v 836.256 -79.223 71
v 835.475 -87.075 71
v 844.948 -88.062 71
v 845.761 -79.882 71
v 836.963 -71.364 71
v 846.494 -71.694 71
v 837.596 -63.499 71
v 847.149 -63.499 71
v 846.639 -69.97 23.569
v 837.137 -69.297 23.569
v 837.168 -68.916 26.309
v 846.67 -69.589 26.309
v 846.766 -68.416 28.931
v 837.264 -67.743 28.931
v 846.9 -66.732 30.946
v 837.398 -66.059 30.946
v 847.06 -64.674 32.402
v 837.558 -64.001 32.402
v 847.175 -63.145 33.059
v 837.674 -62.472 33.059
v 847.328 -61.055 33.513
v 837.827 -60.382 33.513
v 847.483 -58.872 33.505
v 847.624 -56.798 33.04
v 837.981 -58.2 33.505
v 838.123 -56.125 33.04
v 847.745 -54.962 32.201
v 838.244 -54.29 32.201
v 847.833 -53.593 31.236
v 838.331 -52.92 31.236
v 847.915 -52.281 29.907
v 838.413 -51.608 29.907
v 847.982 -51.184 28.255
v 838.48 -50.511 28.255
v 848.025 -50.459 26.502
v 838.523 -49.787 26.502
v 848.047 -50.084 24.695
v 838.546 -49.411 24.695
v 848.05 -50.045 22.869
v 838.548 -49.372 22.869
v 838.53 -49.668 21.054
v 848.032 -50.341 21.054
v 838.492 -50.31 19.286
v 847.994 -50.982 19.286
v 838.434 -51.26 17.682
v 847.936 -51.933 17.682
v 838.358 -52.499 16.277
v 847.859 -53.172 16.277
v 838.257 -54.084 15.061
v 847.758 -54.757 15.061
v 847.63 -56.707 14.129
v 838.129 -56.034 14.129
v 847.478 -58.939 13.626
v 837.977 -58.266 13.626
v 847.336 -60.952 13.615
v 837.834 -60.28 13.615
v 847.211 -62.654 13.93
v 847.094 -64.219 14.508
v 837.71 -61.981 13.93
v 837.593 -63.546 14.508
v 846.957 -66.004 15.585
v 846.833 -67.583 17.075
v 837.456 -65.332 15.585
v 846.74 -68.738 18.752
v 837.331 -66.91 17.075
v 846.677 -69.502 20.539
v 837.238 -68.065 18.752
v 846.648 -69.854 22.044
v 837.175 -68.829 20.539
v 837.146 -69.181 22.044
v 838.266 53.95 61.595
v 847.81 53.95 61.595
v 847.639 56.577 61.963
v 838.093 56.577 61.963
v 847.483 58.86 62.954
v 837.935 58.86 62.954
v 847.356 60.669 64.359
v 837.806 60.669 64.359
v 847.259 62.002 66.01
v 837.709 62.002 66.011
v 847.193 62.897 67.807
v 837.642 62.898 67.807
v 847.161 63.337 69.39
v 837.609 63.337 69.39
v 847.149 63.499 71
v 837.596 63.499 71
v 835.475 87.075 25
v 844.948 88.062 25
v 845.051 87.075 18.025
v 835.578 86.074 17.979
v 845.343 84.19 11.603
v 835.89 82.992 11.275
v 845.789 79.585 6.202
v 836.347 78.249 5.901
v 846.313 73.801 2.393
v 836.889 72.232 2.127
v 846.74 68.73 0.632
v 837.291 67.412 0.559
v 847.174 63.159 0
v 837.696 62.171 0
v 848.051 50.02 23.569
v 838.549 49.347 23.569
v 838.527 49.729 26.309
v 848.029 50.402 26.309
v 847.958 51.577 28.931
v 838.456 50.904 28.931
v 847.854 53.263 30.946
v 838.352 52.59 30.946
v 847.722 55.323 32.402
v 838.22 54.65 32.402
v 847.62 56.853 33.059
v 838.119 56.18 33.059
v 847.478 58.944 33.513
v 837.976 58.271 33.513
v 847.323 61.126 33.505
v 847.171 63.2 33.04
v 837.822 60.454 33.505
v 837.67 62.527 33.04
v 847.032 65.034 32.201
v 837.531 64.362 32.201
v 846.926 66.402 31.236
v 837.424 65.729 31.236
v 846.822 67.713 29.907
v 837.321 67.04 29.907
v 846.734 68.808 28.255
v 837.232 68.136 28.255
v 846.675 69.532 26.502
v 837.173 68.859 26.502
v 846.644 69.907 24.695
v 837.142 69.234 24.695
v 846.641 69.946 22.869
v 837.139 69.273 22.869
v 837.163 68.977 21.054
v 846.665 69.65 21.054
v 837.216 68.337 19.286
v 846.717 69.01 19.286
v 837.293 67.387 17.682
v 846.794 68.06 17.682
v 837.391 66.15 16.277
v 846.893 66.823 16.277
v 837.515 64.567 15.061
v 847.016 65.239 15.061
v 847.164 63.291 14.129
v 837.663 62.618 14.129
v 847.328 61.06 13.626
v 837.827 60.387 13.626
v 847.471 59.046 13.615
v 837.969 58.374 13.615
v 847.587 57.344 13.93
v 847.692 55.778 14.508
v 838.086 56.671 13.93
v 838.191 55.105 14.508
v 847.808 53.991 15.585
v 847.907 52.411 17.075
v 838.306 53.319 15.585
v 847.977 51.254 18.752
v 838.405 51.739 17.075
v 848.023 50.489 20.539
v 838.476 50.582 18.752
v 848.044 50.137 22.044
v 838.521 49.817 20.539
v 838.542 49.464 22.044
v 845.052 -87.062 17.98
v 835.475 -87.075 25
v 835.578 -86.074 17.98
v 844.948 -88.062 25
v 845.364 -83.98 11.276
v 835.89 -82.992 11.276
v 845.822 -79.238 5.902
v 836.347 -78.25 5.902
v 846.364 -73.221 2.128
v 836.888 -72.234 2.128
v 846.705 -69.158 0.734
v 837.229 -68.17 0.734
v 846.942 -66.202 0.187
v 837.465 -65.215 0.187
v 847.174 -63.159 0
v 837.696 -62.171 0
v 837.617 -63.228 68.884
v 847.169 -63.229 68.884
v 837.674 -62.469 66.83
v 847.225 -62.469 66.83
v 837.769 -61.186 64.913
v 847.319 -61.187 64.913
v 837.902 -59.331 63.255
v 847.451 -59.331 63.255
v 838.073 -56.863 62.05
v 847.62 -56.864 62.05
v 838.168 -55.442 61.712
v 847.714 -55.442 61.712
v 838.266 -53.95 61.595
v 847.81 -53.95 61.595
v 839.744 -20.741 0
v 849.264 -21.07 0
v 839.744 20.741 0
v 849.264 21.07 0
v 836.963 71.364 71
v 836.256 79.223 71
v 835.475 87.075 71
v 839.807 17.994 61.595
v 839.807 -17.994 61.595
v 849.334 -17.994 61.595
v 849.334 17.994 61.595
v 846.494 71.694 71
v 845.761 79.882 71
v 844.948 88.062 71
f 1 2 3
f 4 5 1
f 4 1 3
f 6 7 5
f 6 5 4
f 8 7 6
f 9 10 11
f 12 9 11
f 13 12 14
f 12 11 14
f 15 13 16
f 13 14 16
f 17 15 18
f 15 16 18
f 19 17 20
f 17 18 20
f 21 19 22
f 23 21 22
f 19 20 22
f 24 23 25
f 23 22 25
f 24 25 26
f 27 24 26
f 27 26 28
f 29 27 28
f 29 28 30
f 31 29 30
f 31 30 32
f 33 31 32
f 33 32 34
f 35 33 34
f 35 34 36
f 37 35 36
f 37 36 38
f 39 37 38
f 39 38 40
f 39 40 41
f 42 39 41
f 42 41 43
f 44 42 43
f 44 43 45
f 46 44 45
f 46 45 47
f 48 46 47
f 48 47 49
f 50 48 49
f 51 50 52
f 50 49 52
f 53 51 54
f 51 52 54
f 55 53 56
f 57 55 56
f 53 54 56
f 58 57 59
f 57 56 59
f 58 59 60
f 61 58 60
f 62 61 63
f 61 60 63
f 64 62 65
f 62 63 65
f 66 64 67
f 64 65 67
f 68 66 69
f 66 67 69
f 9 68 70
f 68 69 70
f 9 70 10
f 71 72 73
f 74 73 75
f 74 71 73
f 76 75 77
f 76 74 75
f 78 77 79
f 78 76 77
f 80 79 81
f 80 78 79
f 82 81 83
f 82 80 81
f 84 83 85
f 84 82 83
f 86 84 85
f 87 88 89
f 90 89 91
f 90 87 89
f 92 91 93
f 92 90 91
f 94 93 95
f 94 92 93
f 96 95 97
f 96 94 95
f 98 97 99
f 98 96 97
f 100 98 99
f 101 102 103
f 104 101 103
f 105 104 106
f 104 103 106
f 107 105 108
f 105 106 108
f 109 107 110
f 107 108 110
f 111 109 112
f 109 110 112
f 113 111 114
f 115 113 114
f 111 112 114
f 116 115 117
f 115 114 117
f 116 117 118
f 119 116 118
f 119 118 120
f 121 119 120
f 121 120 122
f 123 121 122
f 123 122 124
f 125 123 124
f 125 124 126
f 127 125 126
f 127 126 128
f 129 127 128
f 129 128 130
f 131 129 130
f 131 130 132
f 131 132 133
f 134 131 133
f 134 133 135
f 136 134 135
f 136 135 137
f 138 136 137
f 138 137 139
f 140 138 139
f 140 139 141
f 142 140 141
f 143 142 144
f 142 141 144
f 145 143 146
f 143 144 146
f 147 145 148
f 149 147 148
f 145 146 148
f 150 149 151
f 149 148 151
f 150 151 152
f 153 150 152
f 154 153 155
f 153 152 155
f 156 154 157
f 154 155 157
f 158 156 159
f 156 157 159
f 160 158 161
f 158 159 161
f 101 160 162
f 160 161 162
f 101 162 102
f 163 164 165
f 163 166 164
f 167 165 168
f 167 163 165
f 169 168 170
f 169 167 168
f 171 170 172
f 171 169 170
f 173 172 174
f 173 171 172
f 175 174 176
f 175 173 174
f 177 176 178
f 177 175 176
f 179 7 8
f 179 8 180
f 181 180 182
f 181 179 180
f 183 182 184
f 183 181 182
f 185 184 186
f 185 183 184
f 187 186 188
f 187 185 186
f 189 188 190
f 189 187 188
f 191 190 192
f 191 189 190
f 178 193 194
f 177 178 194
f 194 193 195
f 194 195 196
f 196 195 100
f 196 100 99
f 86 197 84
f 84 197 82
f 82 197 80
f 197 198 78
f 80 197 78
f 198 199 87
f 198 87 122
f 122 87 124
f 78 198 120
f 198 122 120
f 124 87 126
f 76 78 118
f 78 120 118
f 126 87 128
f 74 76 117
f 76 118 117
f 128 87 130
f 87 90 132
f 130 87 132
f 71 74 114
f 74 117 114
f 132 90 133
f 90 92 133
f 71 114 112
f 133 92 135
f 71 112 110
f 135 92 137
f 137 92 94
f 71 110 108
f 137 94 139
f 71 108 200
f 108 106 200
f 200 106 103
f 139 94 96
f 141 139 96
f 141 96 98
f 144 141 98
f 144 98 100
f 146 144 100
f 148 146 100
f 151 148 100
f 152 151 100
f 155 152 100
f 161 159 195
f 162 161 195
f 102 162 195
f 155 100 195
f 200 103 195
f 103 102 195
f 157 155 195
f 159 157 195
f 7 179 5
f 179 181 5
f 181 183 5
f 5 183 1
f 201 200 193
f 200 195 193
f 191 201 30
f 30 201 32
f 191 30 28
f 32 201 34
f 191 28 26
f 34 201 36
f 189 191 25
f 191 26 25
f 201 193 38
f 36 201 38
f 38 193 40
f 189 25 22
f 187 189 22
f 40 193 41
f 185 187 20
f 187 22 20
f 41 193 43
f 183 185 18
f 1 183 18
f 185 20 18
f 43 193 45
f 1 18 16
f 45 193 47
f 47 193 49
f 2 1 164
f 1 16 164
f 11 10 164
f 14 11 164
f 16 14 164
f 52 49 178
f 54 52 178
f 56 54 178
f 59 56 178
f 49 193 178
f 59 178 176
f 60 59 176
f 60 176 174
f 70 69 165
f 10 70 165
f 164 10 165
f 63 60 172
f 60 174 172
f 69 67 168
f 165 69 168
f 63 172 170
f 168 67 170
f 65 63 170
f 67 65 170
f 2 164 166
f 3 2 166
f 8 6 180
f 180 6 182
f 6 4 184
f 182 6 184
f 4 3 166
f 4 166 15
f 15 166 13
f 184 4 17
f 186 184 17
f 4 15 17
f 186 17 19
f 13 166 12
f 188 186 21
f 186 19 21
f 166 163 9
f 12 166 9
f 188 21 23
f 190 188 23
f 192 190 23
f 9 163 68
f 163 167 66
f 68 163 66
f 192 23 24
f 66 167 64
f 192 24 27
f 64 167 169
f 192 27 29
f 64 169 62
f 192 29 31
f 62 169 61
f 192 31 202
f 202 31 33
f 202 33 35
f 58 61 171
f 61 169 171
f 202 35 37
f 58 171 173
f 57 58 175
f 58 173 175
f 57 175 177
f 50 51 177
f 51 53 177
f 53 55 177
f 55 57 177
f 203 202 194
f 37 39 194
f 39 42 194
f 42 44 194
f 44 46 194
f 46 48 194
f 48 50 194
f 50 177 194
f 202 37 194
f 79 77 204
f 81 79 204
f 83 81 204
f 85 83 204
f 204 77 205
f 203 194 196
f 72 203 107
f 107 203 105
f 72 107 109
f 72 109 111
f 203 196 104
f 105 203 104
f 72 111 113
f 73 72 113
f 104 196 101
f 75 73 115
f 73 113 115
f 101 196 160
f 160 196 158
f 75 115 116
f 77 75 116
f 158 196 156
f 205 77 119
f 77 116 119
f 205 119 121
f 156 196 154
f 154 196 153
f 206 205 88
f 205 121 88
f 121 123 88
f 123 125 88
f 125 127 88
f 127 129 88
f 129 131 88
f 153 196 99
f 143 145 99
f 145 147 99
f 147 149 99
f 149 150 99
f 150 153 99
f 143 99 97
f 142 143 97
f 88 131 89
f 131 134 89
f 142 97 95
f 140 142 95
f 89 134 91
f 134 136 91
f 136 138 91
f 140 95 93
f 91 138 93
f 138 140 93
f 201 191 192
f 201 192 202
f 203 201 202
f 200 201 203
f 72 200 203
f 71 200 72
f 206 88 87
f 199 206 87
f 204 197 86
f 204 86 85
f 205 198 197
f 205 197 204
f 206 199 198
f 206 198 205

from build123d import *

# Parameters (mm, degrees)
F1_DEPTH  = 71
F2_R      = 25
F4_DEPTH  = 849.526
F8_R      = 10
F9_DEPTH  = 853.624132
F10_R     = 10
F11_DEPTH = 853.624132


with BuildPart() as f1:
    # F0 (on Top) → F1 (new body)
    with BuildSketch(Plane.XY):
        with BuildLine():
            Line((844.948384, 88.06222), (835.474697, 87.074853))
            ThreePointArc((835.474697, 87.074853), (840, 0), (835.474697, -87.074853))
            Line((835.474697, -87.074853), (844.948384, -88.06222))
            ThreePointArc((844.948384, -88.06222), (849.525, 0), (844.948384, 88.06222))
        make_face()
    extrude(amount=F1_DEPTH)

    # F2
    f2_edges = [f1.edges().sort_by_distance(p)[0] for p in [
        (840.211541, -87.568536, 0),
        (840.211541, 87.568536, 0),
    ]]
    fillet(f2_edges, radius=F2_R)

    # F3 (on Right) → F4 (cut, through all)
    with BuildSketch(Plane.YZ):
        with BuildLine():
            Line((-53.95, 61.595), (53.95, 61.595))
            ThreePointArc((53.95, 61.595), (60.70287, 64.39213), (63.5, 71.145))
            Line((63.5, 71.145), (63.5, 188.595))
            Line((63.5, 188.595), (-63.5, 188.595))
            Line((-63.5, 188.595), (-63.5, 71.145))
            ThreePointArc((-63.5, 71.145), (-60.70287, 64.39213), (-53.95, 61.595))
        make_face()
    extrude(amount=F4_DEPTH, mode=Mode.SUBTRACT)

    # F8 (on face) → F9 (cut, through all)
    with BuildSketch(Plane(origin=(0, 0, 0), x_dir=(-0.070627, -0.997503, 0), z_dir=(-0.997503, 0.070627, 0))):
        with Locations((0, 23.569)):
            Circle(F8_R)
    extrude(amount=-F9_DEPTH, mode=Mode.SUBTRACT)

    # F10 (on face) → F11 (cut, through all)
    with BuildSketch(Plane(origin=(0, 0, 0), x_dir=(0.070627, -0.997503, 0), z_dir=(-0.997503, -0.070627, 0))):
        with Locations((0, 23.569)):
            Circle(F10_R)
    extrude(amount=-F11_DEPTH, mode=Mode.SUBTRACT)


solid = f1.part
